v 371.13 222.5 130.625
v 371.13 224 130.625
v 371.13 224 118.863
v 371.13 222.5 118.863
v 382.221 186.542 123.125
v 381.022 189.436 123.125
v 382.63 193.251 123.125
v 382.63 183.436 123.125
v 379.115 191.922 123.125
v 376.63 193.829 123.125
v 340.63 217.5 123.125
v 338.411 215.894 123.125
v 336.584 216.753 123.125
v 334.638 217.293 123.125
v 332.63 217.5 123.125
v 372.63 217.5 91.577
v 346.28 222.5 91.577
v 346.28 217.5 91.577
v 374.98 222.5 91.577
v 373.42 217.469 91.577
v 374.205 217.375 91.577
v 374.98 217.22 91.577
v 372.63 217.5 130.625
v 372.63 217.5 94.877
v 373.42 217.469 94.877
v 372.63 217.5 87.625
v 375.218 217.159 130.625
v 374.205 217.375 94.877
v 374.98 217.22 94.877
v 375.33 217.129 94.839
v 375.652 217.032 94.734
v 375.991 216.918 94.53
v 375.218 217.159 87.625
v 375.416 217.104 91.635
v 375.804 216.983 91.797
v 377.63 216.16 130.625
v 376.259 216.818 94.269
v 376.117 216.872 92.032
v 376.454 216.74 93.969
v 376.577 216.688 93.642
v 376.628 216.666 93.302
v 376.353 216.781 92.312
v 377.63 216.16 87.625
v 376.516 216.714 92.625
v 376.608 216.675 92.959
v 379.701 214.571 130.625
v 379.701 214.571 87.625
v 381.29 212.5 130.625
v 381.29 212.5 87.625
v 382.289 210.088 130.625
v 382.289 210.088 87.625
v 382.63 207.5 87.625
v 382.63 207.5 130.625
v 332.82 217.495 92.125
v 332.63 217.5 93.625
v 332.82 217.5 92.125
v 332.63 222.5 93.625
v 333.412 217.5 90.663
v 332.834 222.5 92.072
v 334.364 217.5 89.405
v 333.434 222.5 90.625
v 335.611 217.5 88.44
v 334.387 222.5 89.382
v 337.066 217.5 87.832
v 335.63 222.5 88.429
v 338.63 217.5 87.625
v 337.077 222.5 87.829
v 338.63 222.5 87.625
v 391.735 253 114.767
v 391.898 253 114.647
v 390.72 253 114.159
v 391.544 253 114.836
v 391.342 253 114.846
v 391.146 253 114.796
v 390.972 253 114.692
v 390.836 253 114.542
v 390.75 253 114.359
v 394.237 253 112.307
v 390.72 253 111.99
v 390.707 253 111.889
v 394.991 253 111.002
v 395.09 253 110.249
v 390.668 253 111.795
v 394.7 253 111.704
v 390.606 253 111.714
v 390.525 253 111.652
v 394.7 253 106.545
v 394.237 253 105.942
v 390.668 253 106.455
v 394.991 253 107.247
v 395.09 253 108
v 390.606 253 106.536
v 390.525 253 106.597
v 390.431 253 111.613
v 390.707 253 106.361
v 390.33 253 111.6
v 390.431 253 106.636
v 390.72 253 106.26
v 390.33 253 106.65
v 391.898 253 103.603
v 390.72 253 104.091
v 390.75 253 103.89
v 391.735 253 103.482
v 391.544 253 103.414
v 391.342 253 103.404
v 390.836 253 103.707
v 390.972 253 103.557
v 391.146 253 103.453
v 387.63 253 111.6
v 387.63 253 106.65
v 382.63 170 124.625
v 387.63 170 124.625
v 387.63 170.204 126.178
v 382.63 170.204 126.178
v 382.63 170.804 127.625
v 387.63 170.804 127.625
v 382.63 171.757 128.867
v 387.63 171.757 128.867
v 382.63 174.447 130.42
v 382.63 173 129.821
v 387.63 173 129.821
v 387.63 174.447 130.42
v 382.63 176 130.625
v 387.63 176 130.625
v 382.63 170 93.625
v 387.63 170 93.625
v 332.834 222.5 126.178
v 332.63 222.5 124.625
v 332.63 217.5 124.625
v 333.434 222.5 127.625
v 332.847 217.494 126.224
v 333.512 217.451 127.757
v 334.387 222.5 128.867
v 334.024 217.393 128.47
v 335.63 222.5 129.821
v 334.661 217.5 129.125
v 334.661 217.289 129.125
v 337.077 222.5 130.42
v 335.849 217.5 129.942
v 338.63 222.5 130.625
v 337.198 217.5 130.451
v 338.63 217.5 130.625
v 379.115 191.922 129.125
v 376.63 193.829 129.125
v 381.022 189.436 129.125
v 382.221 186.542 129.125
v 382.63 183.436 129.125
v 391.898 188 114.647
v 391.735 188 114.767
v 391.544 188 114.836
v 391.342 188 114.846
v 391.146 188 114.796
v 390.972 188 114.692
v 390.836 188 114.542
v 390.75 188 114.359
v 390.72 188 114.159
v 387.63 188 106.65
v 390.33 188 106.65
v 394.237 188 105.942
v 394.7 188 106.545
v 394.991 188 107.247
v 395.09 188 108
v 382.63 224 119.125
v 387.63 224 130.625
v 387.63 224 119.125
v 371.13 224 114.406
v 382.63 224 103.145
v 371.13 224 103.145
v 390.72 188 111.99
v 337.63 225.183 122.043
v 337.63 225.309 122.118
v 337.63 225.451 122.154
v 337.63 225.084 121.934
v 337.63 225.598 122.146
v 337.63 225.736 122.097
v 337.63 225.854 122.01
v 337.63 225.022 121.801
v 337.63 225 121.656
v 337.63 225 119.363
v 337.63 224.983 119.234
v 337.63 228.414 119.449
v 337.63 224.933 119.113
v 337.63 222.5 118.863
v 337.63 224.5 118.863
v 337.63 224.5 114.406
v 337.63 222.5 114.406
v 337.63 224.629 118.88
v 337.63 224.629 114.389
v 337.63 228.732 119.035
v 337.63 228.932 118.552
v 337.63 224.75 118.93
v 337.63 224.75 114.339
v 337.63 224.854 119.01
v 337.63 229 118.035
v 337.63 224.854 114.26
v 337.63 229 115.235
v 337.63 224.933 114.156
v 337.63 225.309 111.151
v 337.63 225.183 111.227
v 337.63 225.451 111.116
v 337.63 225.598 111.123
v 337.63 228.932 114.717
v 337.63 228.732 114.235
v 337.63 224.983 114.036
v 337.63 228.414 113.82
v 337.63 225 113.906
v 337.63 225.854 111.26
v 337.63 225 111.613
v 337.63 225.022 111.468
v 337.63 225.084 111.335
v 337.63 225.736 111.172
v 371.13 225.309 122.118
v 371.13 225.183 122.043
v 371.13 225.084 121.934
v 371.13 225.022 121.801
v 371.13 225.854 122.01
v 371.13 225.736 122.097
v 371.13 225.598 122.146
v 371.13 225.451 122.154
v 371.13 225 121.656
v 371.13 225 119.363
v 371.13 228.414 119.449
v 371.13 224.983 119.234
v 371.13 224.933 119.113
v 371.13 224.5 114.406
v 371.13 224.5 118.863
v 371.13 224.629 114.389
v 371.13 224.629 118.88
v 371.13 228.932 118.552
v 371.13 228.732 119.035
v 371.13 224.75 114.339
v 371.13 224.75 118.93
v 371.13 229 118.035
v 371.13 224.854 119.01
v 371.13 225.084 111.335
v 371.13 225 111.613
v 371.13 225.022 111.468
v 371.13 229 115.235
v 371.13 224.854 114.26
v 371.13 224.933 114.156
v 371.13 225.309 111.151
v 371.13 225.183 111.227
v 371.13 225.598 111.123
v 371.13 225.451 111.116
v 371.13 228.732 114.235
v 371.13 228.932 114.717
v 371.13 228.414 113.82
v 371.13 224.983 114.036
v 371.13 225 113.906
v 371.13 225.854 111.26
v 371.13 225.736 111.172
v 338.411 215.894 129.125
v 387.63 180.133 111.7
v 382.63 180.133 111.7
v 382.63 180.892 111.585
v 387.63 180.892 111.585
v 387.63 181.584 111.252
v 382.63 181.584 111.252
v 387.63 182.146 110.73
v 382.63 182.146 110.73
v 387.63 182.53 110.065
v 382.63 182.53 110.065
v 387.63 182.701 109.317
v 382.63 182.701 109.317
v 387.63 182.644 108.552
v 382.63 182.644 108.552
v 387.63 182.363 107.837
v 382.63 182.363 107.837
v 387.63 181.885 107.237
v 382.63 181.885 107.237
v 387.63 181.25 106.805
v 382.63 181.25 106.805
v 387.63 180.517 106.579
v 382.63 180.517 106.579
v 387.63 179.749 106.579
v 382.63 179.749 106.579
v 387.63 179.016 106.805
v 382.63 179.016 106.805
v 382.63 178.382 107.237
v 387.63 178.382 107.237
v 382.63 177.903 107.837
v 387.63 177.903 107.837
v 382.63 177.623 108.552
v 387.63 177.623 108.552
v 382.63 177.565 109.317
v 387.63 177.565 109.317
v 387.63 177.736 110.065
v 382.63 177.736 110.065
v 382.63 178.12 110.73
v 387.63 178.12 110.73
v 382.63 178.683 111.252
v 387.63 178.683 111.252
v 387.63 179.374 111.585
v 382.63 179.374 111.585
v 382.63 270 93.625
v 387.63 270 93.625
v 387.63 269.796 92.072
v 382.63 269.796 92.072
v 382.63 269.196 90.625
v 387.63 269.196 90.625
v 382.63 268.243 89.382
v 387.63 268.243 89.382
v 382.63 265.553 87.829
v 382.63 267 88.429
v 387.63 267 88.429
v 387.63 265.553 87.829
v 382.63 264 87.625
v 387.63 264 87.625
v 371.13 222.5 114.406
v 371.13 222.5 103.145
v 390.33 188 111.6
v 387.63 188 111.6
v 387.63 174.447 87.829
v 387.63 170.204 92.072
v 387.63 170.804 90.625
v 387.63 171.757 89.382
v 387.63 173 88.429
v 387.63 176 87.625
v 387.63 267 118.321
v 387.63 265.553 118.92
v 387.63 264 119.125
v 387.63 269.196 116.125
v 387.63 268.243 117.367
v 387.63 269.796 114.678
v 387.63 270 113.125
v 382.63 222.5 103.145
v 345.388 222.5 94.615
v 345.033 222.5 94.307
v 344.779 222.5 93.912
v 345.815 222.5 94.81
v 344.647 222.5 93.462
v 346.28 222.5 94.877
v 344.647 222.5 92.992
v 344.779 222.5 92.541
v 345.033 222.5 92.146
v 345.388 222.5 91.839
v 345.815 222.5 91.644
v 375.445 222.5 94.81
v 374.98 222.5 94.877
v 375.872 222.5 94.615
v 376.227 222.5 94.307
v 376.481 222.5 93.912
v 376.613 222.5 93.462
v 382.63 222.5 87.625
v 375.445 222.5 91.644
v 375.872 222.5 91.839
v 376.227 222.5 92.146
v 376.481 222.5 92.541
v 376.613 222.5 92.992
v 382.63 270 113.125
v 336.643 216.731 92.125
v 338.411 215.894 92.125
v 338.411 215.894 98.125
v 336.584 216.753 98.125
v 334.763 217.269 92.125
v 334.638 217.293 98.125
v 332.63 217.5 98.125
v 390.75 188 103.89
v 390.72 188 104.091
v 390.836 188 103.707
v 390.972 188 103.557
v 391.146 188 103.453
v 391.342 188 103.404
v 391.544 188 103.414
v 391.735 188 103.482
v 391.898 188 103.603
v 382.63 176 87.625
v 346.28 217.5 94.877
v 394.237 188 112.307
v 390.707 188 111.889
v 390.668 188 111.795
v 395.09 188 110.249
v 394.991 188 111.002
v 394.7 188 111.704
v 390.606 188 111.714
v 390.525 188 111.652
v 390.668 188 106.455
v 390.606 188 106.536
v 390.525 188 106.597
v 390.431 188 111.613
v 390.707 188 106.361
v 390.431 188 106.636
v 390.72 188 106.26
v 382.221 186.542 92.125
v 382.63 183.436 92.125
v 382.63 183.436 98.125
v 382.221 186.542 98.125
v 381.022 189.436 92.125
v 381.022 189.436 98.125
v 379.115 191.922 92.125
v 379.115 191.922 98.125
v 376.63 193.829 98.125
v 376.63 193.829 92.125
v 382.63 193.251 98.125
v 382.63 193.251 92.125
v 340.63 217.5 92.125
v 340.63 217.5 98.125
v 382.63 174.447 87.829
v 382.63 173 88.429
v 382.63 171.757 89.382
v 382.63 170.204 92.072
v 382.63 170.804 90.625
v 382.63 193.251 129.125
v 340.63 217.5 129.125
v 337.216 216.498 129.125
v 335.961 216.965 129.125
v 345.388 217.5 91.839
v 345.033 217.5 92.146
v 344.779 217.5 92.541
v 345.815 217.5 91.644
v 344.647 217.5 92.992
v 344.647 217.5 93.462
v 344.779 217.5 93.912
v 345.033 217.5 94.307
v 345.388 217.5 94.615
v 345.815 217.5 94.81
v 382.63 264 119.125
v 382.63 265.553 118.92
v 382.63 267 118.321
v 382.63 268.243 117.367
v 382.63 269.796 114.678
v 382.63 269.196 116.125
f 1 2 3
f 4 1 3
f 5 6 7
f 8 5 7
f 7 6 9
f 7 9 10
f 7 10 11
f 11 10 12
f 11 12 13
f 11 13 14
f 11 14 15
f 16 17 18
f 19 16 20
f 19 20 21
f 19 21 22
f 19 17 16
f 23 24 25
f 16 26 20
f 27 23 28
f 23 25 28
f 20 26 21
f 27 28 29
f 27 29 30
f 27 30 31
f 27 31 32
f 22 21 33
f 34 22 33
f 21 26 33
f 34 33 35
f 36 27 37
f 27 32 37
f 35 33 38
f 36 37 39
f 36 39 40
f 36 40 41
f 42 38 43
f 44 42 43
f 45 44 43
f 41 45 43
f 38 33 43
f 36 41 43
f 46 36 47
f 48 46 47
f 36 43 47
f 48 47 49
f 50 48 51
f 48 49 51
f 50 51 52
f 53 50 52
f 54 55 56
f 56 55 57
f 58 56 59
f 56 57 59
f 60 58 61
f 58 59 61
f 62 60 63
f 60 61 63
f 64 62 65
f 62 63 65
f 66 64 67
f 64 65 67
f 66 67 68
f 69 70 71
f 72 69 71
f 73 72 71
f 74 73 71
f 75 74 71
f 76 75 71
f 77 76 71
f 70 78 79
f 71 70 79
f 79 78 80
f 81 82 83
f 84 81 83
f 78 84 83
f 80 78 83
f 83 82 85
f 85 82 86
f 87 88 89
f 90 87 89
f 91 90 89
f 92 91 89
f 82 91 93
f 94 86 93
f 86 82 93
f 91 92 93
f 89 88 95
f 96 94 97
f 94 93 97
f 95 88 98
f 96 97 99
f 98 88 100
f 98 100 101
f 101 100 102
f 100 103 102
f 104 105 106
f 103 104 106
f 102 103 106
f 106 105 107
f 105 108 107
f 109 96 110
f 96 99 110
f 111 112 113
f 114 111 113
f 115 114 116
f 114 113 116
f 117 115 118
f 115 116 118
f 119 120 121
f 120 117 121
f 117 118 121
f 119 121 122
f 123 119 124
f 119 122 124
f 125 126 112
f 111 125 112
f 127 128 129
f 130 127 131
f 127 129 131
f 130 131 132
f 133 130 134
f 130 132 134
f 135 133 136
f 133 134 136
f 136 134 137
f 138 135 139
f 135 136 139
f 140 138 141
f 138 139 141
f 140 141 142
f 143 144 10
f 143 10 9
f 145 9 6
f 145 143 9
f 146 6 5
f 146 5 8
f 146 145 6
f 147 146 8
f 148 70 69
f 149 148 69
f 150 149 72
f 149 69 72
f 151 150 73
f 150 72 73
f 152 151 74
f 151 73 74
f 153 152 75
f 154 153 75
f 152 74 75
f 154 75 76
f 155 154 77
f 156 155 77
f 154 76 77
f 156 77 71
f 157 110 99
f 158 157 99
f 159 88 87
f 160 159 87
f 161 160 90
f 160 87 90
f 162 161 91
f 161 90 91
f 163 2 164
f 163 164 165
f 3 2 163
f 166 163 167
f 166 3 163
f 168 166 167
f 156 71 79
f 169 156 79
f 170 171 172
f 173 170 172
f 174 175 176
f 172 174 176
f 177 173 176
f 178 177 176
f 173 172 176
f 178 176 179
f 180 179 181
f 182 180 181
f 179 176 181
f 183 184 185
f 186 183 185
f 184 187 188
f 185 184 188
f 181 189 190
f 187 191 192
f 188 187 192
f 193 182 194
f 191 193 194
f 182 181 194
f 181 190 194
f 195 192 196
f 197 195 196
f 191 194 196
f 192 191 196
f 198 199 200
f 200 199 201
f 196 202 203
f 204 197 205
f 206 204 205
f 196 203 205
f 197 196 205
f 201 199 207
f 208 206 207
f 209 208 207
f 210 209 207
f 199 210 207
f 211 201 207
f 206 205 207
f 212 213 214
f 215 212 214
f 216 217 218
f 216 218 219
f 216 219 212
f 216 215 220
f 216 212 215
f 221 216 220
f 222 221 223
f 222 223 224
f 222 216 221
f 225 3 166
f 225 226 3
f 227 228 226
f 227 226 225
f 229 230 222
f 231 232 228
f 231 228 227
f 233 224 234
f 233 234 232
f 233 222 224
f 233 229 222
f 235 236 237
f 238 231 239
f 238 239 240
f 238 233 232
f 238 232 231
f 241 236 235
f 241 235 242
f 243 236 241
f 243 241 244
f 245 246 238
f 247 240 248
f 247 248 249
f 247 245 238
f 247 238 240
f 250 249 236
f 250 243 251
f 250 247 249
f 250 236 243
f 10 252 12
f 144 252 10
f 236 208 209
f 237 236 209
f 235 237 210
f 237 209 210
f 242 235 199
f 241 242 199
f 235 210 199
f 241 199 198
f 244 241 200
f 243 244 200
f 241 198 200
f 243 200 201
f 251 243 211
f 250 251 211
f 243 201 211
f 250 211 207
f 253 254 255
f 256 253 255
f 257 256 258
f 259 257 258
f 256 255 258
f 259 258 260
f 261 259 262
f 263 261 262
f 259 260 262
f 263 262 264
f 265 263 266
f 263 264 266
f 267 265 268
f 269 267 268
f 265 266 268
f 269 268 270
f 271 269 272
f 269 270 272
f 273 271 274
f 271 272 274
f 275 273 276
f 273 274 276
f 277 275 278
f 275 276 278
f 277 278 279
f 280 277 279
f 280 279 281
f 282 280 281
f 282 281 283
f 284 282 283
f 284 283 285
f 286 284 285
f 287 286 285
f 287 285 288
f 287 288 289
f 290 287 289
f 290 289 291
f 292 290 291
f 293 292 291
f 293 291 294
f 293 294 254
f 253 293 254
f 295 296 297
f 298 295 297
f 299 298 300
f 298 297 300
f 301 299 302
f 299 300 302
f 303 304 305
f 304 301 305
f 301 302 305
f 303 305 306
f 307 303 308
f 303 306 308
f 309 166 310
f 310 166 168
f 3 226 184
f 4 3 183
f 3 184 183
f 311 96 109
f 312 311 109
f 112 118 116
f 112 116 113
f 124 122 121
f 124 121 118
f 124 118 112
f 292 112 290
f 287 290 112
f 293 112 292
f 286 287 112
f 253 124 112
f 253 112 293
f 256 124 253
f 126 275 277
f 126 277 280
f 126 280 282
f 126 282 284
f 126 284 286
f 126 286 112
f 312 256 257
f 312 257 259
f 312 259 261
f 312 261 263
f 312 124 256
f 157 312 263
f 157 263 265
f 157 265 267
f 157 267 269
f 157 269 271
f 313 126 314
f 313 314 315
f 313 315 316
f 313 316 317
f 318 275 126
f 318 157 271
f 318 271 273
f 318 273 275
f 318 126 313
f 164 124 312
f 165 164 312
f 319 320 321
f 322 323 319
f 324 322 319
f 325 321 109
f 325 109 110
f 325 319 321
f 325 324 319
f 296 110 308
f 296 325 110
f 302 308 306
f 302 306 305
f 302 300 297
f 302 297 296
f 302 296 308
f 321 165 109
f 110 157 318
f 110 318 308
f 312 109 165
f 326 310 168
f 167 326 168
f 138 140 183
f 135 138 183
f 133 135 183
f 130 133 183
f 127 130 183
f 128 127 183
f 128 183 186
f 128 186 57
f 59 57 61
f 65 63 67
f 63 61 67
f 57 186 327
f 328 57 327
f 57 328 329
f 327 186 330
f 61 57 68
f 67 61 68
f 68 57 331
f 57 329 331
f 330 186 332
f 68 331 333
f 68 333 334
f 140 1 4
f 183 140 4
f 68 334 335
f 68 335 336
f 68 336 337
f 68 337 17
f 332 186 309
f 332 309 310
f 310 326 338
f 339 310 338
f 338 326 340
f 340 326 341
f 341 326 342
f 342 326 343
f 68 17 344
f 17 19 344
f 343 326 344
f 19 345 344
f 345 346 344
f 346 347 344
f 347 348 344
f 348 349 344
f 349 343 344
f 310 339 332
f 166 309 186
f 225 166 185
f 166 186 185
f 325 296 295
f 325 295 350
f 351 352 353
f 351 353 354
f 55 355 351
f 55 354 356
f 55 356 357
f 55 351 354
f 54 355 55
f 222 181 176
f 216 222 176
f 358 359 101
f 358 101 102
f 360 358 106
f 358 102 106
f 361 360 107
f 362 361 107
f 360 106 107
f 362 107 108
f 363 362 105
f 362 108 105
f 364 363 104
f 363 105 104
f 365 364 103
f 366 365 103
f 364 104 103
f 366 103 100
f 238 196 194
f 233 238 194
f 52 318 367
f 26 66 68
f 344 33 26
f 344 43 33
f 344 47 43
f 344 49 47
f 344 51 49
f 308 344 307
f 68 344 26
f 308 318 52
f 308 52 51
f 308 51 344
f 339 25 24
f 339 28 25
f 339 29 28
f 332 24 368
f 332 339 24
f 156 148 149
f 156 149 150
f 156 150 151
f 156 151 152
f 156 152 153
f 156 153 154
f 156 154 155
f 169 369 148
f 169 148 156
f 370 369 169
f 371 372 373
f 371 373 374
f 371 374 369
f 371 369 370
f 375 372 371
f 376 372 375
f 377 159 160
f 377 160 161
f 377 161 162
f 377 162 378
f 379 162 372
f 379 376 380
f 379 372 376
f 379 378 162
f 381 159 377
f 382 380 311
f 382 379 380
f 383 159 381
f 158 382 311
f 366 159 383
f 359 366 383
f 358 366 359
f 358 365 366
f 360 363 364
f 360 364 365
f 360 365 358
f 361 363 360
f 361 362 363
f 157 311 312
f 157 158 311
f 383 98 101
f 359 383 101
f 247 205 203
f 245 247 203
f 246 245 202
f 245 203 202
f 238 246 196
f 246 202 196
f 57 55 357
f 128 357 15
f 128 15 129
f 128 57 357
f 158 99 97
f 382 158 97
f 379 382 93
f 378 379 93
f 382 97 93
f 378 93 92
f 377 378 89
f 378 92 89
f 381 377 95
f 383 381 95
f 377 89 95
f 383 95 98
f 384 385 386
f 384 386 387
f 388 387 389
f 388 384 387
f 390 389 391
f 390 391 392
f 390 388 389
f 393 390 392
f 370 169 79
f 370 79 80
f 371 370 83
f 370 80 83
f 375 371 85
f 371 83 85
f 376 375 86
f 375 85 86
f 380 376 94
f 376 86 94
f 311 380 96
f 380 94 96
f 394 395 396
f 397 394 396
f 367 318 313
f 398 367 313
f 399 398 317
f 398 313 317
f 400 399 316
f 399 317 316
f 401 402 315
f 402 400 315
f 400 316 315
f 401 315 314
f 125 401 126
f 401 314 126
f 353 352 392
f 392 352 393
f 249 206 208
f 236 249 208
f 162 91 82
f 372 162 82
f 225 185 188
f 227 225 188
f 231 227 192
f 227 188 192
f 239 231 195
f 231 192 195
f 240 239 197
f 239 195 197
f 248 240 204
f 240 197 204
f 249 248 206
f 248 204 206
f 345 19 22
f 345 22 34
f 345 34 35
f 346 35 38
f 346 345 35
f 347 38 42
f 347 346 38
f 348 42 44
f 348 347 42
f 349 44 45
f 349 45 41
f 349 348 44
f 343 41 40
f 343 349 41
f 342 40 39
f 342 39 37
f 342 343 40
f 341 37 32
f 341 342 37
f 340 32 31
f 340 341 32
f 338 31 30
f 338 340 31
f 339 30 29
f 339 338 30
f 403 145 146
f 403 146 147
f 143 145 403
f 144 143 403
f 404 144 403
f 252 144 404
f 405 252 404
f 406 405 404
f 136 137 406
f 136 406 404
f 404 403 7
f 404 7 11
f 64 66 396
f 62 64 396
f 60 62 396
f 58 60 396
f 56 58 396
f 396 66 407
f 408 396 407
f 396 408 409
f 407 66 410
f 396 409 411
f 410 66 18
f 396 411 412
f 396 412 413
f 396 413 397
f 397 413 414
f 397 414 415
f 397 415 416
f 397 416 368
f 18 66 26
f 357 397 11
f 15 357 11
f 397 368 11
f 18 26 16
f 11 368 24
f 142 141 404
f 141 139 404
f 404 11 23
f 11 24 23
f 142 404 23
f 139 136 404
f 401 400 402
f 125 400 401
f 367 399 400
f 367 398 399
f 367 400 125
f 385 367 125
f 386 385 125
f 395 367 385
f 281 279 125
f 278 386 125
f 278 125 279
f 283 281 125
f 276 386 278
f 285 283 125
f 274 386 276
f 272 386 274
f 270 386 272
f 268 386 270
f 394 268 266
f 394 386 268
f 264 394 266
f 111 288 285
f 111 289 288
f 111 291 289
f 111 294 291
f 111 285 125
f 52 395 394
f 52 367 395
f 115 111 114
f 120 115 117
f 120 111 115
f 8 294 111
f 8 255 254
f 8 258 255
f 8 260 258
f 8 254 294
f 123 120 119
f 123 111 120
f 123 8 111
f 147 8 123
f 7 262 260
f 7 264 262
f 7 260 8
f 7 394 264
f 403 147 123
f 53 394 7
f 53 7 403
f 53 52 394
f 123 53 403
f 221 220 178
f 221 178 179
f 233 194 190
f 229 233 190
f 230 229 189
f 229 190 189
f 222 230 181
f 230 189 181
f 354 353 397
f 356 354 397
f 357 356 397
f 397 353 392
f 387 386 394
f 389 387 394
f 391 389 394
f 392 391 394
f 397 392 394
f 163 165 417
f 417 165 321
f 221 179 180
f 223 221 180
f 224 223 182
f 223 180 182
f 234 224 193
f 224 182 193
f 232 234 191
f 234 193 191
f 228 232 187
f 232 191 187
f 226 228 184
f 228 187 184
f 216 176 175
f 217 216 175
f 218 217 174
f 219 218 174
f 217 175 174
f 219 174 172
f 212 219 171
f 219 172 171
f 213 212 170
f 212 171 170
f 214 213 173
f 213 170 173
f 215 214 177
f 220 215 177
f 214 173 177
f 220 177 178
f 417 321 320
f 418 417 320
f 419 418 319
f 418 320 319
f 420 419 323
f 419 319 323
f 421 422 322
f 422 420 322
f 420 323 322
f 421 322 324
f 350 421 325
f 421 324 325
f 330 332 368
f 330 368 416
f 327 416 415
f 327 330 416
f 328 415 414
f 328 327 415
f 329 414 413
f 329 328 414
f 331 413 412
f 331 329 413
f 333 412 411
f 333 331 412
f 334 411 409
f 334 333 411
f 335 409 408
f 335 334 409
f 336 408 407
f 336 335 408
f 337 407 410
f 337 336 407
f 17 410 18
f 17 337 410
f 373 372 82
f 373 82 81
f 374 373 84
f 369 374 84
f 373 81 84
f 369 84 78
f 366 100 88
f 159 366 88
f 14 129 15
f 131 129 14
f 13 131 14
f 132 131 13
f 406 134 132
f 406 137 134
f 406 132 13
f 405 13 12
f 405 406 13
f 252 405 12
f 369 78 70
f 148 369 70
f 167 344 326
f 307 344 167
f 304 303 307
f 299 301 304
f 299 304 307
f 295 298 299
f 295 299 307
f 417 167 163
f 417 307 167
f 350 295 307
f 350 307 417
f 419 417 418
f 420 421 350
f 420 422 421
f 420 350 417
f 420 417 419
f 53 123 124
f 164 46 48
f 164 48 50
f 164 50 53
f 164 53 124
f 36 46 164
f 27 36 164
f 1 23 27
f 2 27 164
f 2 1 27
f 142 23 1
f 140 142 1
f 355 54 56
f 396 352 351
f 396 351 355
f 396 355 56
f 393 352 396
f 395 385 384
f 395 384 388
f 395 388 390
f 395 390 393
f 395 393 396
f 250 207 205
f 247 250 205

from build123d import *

# Parameters (mm, degrees)
BOSS_EXTRUDE5_DEPTH  = 50
SKETCH11_W           = 43
SKETCH11_H           = 100
BOSS_EXTRUDE6_DEPTH  = 5
BOSS_EXTRUDE8_DEPTH  = 55
SKETCH13_W           = 11.5
SKETCH13_H           = 47.5
CUT_EXTRUDE1_DEPTH   = 55
BOSS_EXTRUDE9_DEPTH  = 6
FILLET7_R            = 12
FILLET7_OF_MIRROR1_R = 12
FILLET8_R            = 6
BOSS_EXTRUDE10_START = 8
BOSS_EXTRUDE10_DEPTH = 8
FILLET12_R           = 10
BOSS_EXTRUDE11_DEPTH = 57
SKETCH16_R           = 2.575
CUT_EXTRUDE2_DEPTH   = 10
SKETCH17_W           = 27.480150942
SKETCH17_H           = 1.5
BOSS_EXTRUDE12_DEPTH = 11.5
SKETCH18_W           = 11.5
SKETCH18_H           = 1.5
BOSS_EXTRUDE13_DEPTH = 5
BOSS_EXTRUDE15_START = -5
BOSS_EXTRUDE15_DEPTH = 33.5
CUT_EXTRUDE3_DEPTH   = 6


with BuildPart() as part:
    # Sketch9 → Boss-Extrude5 (new body)
    with BuildSketch(Plane(origin=(0, 245, 0), x_dir=(1, 0, 0), z_dir=(0, 1, 0))):
        with BuildLine():
            Line((389.629800237, -111.599739584), (387.629800237, -111.599739584))
            Line((387.629800237, -111.599739584), (387.629800237, -106.649739584))
            Line((387.629800237, -106.649739584), (389.629800237, -106.649739584))
            Line((389.629800237, -106.649739584), (390.329799474, -106.649739584))
            ThreePointArc((390.329799474, -106.649739584), (390.605571069, -106.535511279), (390.719799474, -106.259739725))
            Line((390.719799474, -106.259739725), (390.719800256, -104.090618139))
            ThreePointArc((390.719800256, -104.090618139), (391.145748802, -103.453141463), (391.897703935, -103.602714709))
            Line((391.897703935, -103.602714709), (394.237480965, -105.942491739))
            ThreePointArc((394.237480965, -105.942491739), (394.868289671, -106.886563682), (395.089800232, -108.000172467))
            Line((395.089800232, -108.000172467), (395.089800237, -110.249306685))
            ThreePointArc((395.089800237, -110.249306685), (394.868289678, -111.362915477), (394.23748097, -112.306987424))
            Line((394.23748097, -112.306987424), (391.897703941, -114.646764454))
            ThreePointArc((391.897703941, -114.646764454), (391.145748809, -114.7963377), (390.719800262, -114.158861025))
            Line((390.719800262, -114.158861025), (390.719799474, -111.989739443))
            ThreePointArc((390.719799474, -111.989739443), (390.605571069, -111.71396789), (390.329799474, -111.599739584))
            Line((390.329799474, -111.599739584), (389.629800237, -111.599739584))
        make_face()
    extrude(amount=-BOSS_EXTRUDE5_DEPTH)

    # Sketch11 → Boss-Extrude6 (add)
    with BuildSketch(Plane.ZY.offset(-387.629800242)):
        with Locations((109.124739584, 220)):
            Rectangle(SKETCH11_W, SKETCH11_H)
    extrude(amount=BOSS_EXTRUDE6_DEPTH)

    # Sketch12 → Boss-Extrude8 (add)
    with BuildSketch(Plane.ZY.offset(-387.629800242)):
        Polygon((130.624739584, 222.5), (89.124739584, 222.5), (87.624739584, 222.5), (87.624739584, 217.5), (89.124739584, 217.5), (130.624739584, 217.5), align=None)
    extrude(amount=BOSS_EXTRUDE8_DEPTH)

    # Sketch13 → Cut-Extrude1 (cut)
    with BuildSketch(Plane.ZY.offset(-387.629800242)):
        with Locations((124.874739584, 246.25)):
            Rectangle(SKETCH13_W, SKETCH13_H)
    extrude(amount=CUT_EXTRUDE1_DEPTH, mode=Mode.SUBTRACT)

    # Sketch15 → Boss-Extrude9 (add)
    with BuildSketch(Plane.XY.offset(129.124739584)):
        Polygon((335.629800242, 217.5), (382.629800242, 190.364537348), (382.629800242, 193.251288694), (340.629800242, 217.5), align=None)
    boss_extrude9 = extrude(amount=-BOSS_EXTRUDE9_DEPTH)

    # Fillet7
    # the kernel refuses this fillet: 12 mm, written as the material it adds along each edge
    with BuildSketch(Plane(origin=(335.629800242, 217.5, 129.124739584), x_dir=(-1, 0, 0), z_dir=(0, 0, -1))) as fillet7_piece_1:
        with BuildLine():
            CenterArc((3.218847051, -11.998004249), FILLET7_R, 91.044975628, 28.955024372)
            Line((-2.781152949, -1.605699404), (-2.901152949, -1.397853307))
            Line((-2.901152949, -1.397853307), (-0.12, 0.207846097))
            Line((-0.12, 0.207846097), (0, 0.24))
            ThreePointArc((0, 0.24), (1.5, 0.24), (2.995623059, 0.239960085))
            Line((2.995623059, 0.239960085), (3, 0))
        make_face()
    extrude(amount=6)
    with BuildSketch(Plane(origin=(382.629800242, 190.364537348, 129.124739584), x_dir=(0, -1, 0), z_dir=(0, 0, -1))) as fillet7_piece_2:
        with BuildLine():
            CenterArc((FILLET7_R * 0.57735026919, FILLET7_R), FILLET7_R, 210, 60)
            Line((-FILLET7_R * 0.288675134595, FILLET7_R * 0.5), (-FILLET7_R * 0.305995642671, FILLET7_R * 0.49))
            Line((-FILLET7_R * 0.305995642671, FILLET7_R * 0.49), (-FILLET7_R * 0.0115470053838, -FILLET7_R * 0.02))
            Line((-FILLET7_R * 0.0115470053838, -FILLET7_R * 0.02), (FILLET7_R * 0.57735026919, -FILLET7_R * 0.02))
            Line((FILLET7_R * 0.57735026919, -FILLET7_R * 0.02), (FILLET7_R * 0.57735026919, 0))
        make_face()
    extrude(amount=6)

    # Mirror1: Boss-Extrude9 across plane
    add(boss_extrude9.mirror(Plane.XY.offset(110.624739584)))

    # Fillet7 of Mirror1
    # the kernel refuses this fillet: 12 mm, written as the material it adds along each edge
    with BuildSketch(Plane(origin=(335.629800242, 217.5, 92.124739584), x_dir=(-1, 0, 0), z_dir=(0, 0, 1))) as fillet7_of_mirror1_piece_1:
        with BuildLine():
            CenterArc((3.218847051, 11.998004249), FILLET7_OF_MIRROR1_R, 240, 28.955024372)
            Line((-2.781152949, 1.605699404), (-2.901152949, 1.397853307))
            Line((-2.901152949, 1.397853307), (-0.12, -0.207846097))
            Line((-0.12, -0.207846097), (0, -0.24))
            ThreePointArc((0, -0.24), (1.5, -0.24), (2.995623059, -0.239960085))
            Line((2.995623059, -0.239960085), (3, 0))
        make_face()
    extrude(amount=6)
    with BuildSketch(Plane(origin=(382.629800242, 190.364537348, 92.124739584), x_dir=(0, -1, 0), z_dir=(0, 0, 1))) as fillet7_of_mirror1_piece_2:
        with BuildLine():
            CenterArc((FILLET7_OF_MIRROR1_R * 0.57735026919, -FILLET7_OF_MIRROR1_R), FILLET7_OF_MIRROR1_R, 90, 60)
            Line((-FILLET7_OF_MIRROR1_R * 0.288675134595, -FILLET7_OF_MIRROR1_R * 0.5), (-FILLET7_OF_MIRROR1_R * 0.305995642671, -FILLET7_OF_MIRROR1_R * 0.49))
            Line((-FILLET7_OF_MIRROR1_R * 0.305995642671, -FILLET7_OF_MIRROR1_R * 0.49), (-FILLET7_OF_MIRROR1_R * 0.0115470053838, FILLET7_OF_MIRROR1_R * 0.02))
            Line((-FILLET7_OF_MIRROR1_R * 0.0115470053838, FILLET7_OF_MIRROR1_R * 0.02), (FILLET7_OF_MIRROR1_R * 0.57735026919, FILLET7_OF_MIRROR1_R * 0.02))
            Line((FILLET7_OF_MIRROR1_R * 0.57735026919, FILLET7_OF_MIRROR1_R * 0.02), (FILLET7_OF_MIRROR1_R * 0.57735026919, 0))
        make_face()
    extrude(amount=6)

    # Fillet8
    # the kernel refuses this fillet: 6 mm, written as the material it takes off along each edge
    with BuildSketch(Plane(origin=(402.629800242, 270, 87.624739584), x_dir=(0, 0, 1), z_dir=(-1, 0, 0)), Plane(origin=(332.629800242, 237.5, 87.624739584), x_dir=(0, 0, 1), z_dir=(0, -1, 0)), Plane(origin=(402.629800242, 270, 119.124739584), x_dir=(0, -1, 0), z_dir=(-1, 0, 0))) as fillet8_piece_1:
        with BuildLine():
            CenterArc((FILLET8_R, -FILLET8_R), FILLET8_R, 90, 90)
            Line((0, -FILLET8_R), (0, 0))
            Line((0, 0), (FILLET8_R, 0))
        make_face()
    extrude(amount=35, mode=Mode.SUBTRACT)
    with BuildSketch(Plane(origin=(402.629800242, 170, 87.624739584), x_dir=(0, 0, 1), z_dir=(-1, 0, 0)), Plane(origin=(402.629800242, 170, 130.624739584), x_dir=(0, 1, 0), z_dir=(-1, 0, 0)), Plane(origin=(332.629800242, 202.5, 130.624739584), x_dir=(1, 0, 0), z_dir=(0, 1, 0))) as fillet8_piece_2:
        with BuildLine():
            CenterArc((FILLET8_R, FILLET8_R), FILLET8_R, 180, 90)
            Line((0, FILLET8_R), (0, 0))
            Line((0, 0), (FILLET8_R, 0))
        make_face()
    extrude(amount=35, mode=Mode.SUBTRACT)

    # Sketch9<2> → Boss-Extrude10 (add)
    with BuildSketch(Plane(origin=(0, 245, 0), x_dir=(1, 0, 0), z_dir=(0, 1, 0)).offset(BOSS_EXTRUDE10_START)):
        with BuildLine():
            Line((389.629800237, -111.599739584), (387.629800237, -111.599739584))
            Line((387.629800237, -111.599739584), (387.629800237, -106.649739584))
            Line((387.629800237, -106.649739584), (389.629800237, -106.649739584))
            Line((389.629800237, -106.649739584), (390.329799474, -106.649739584))
            ThreePointArc((390.329799474, -106.649739584), (390.605571069, -106.535511279), (390.719799474, -106.259739725))
            Line((390.719799474, -106.259739725), (390.719800256, -104.090618139))
            ThreePointArc((390.719800256, -104.090618139), (391.145748802, -103.453141463), (391.897703935, -103.602714709))
            Line((391.897703935, -103.602714709), (394.237480965, -105.942491739))
            ThreePointArc((394.237480965, -105.942491739), (394.868289671, -106.886563682), (395.089800232, -108.000172467))
            Line((395.089800232, -108.000172467), (395.089800237, -110.249306685))
            ThreePointArc((395.089800237, -110.249306685), (394.868289678, -111.362915477), (394.23748097, -112.306987424))
            Line((394.23748097, -112.306987424), (391.897703941, -114.646764454))
            ThreePointArc((391.897703941, -114.646764454), (391.145748809, -114.7963377), (390.719800262, -114.158861025))
            Line((390.719800262, -114.158861025), (390.719799474, -111.989739443))
            ThreePointArc((390.719799474, -111.989739443), (390.605571069, -111.71396789), (390.329799474, -111.599739584))
            Line((390.329799474, -111.599739584), (389.629800237, -111.599739584))
        make_face()
    extrude(amount=-BOSS_EXTRUDE10_DEPTH)

    # Fillet12
    fillet12_edges = [part.edges().sort_by_distance(p)[0] for p in [
        (382.629800242, 217.5, 109.124739584),
    ]]
    fillet(fillet12_edges, radius=FILLET12_R)

    # Sketch9<3> → Boss-Extrude11 (add)
    with BuildSketch(Plane(origin=(0, 245, 0), x_dir=(1, 0, 0), z_dir=(0, 1, 0))):
        with BuildLine():
            Line((389.629800237, -111.599739584), (387.629800237, -111.599739584))
            Line((387.629800237, -111.599739584), (387.629800237, -106.649739584))
            Line((387.629800237, -106.649739584), (389.629800237, -106.649739584))
            Line((389.629800237, -106.649739584), (390.329799474, -106.649739584))
            ThreePointArc((390.329799474, -106.649739584), (390.605571069, -106.535511279), (390.719799474, -106.259739725))
            Line((390.719799474, -106.259739725), (390.719800256, -104.090618139))
            ThreePointArc((390.719800256, -104.090618139), (391.145748802, -103.453141463), (391.897703935, -103.602714709))
            Line((391.897703935, -103.602714709), (394.237480965, -105.942491739))
            ThreePointArc((394.237480965, -105.942491739), (394.868289671, -106.886563682), (395.089800232, -108.000172467))
            Line((395.089800232, -108.000172467), (395.089800237, -110.249306685))
            ThreePointArc((395.089800237, -110.249306685), (394.868289678, -111.362915477), (394.23748097, -112.306987424))
            Line((394.23748097, -112.306987424), (391.897703941, -114.646764454))
            ThreePointArc((391.897703941, -114.646764454), (391.145748809, -114.7963377), (390.719800262, -114.158861025))
            Line((390.719800262, -114.158861025), (390.719799474, -111.989739443))
            ThreePointArc((390.719799474, -111.989739443), (390.605571069, -111.71396789), (390.329799474, -111.599739584))
            Line((390.329799474, -111.599739584), (389.629800237, -111.599739584))
        make_face()
    extrude(amount=-BOSS_EXTRUDE11_DEPTH)

    # Sketch16 → Cut-Extrude2 (cut)
    with BuildSketch(Plane.ZY.offset(-382.629800242)):
        with Locations((109.124739584, 180.133064736)):
            Circle(SKETCH16_R)
    extrude(amount=-CUT_EXTRUDE2_DEPTH, mode=Mode.SUBTRACT)

    # Sketch17 → Boss-Extrude12 (add)
    with BuildSketch(Plane(origin=(371.129800242, 0, 0), x_dir=(0, 0, -1), z_dir=(1, 0, 0))):
        with Locations((-116.884664113, 223.25)):
            Rectangle(SKETCH17_W, SKETCH17_H)
    extrude(amount=BOSS_EXTRUDE12_DEPTH)

    # Sketch18 → Boss-Extrude13 (add)
    with BuildSketch(Plane(origin=(382.629800242, 0, 0), x_dir=(0, 0, -1), z_dir=(1, 0, 0))):
        with Locations((-124.874739584, 223.25)):
            Rectangle(SKETCH18_W, SKETCH18_H)
    extrude(amount=BOSS_EXTRUDE13_DEPTH)

    # Sketch22 → Boss-Extrude15 (add)
    with BuildSketch(Plane.ZY.offset(-332.629800242).offset(BOSS_EXTRUDE15_START)):
        with BuildLine():
            Line((114.406150208, 222.5), (114.406150208, 224.5))
            ThreePointArc((114.406150208, 224.5), (114.259703598, 224.853553391), (113.906150208, 225))
            Line((113.906150208, 225), (111.613256989, 225))
            ThreePointArc((111.613256989, 225), (111.151317223, 225.308658284), (111.259703598, 225.853553391))
            Line((111.259703598, 225.853553391), (113.82036377, 228.414213562))
            ThreePointArc((113.82036377, 228.414213562), (114.469210468, 228.847759065), (115.234577333, 229))
            Line((115.234577333, 229), (116.634664113, 229))
            Line((116.634664113, 229), (118.034750894, 229))
            ThreePointArc((118.034750894, 229), (118.800117758, 228.847759065), (119.448964456, 228.414213562))
            Line((119.448964456, 228.414213562), (122.009624628, 225.853553391))
            ThreePointArc((122.009624628, 225.853553391), (122.118011003, 225.308658284), (121.656071237, 225))
            Line((121.656071237, 225), (119.363178018, 225))
            ThreePointArc((119.363178018, 225), (119.009624628, 224.853553391), (118.863178018, 224.5))
            Line((118.863178018, 224.5), (118.863178018, 222.5))
            Line((118.863178018, 222.5), (114.406150208, 222.5))
        make_face()
    extrude(amount=-BOSS_EXTRUDE15_DEPTH)

    # Sketch23 → Cut-Extrude3 (cut)
    with BuildSketch(Plane(origin=(0, 222.5, 0), x_dir=(1, 0, 0), z_dir=(0, 1, 0))):
        with BuildLine():
            Line((346.279800242, -91.576720164), (374.979800242, -91.576720164))
            ThreePointArc((374.979800242, -91.576720164), (376.629800242, -93.226720164), (374.979800242, -94.876720164))
            Line((374.979800242, -94.876720164), (346.279800242, -94.876720164))
            ThreePointArc((346.279800242, -94.876720164), (344.629800242, -93.226720164), (346.279800242, -91.576720164))
        make_face()
    extrude(amount=-CUT_EXTRUDE3_DEPTH, mode=Mode.SUBTRACT)


solid = part.part
